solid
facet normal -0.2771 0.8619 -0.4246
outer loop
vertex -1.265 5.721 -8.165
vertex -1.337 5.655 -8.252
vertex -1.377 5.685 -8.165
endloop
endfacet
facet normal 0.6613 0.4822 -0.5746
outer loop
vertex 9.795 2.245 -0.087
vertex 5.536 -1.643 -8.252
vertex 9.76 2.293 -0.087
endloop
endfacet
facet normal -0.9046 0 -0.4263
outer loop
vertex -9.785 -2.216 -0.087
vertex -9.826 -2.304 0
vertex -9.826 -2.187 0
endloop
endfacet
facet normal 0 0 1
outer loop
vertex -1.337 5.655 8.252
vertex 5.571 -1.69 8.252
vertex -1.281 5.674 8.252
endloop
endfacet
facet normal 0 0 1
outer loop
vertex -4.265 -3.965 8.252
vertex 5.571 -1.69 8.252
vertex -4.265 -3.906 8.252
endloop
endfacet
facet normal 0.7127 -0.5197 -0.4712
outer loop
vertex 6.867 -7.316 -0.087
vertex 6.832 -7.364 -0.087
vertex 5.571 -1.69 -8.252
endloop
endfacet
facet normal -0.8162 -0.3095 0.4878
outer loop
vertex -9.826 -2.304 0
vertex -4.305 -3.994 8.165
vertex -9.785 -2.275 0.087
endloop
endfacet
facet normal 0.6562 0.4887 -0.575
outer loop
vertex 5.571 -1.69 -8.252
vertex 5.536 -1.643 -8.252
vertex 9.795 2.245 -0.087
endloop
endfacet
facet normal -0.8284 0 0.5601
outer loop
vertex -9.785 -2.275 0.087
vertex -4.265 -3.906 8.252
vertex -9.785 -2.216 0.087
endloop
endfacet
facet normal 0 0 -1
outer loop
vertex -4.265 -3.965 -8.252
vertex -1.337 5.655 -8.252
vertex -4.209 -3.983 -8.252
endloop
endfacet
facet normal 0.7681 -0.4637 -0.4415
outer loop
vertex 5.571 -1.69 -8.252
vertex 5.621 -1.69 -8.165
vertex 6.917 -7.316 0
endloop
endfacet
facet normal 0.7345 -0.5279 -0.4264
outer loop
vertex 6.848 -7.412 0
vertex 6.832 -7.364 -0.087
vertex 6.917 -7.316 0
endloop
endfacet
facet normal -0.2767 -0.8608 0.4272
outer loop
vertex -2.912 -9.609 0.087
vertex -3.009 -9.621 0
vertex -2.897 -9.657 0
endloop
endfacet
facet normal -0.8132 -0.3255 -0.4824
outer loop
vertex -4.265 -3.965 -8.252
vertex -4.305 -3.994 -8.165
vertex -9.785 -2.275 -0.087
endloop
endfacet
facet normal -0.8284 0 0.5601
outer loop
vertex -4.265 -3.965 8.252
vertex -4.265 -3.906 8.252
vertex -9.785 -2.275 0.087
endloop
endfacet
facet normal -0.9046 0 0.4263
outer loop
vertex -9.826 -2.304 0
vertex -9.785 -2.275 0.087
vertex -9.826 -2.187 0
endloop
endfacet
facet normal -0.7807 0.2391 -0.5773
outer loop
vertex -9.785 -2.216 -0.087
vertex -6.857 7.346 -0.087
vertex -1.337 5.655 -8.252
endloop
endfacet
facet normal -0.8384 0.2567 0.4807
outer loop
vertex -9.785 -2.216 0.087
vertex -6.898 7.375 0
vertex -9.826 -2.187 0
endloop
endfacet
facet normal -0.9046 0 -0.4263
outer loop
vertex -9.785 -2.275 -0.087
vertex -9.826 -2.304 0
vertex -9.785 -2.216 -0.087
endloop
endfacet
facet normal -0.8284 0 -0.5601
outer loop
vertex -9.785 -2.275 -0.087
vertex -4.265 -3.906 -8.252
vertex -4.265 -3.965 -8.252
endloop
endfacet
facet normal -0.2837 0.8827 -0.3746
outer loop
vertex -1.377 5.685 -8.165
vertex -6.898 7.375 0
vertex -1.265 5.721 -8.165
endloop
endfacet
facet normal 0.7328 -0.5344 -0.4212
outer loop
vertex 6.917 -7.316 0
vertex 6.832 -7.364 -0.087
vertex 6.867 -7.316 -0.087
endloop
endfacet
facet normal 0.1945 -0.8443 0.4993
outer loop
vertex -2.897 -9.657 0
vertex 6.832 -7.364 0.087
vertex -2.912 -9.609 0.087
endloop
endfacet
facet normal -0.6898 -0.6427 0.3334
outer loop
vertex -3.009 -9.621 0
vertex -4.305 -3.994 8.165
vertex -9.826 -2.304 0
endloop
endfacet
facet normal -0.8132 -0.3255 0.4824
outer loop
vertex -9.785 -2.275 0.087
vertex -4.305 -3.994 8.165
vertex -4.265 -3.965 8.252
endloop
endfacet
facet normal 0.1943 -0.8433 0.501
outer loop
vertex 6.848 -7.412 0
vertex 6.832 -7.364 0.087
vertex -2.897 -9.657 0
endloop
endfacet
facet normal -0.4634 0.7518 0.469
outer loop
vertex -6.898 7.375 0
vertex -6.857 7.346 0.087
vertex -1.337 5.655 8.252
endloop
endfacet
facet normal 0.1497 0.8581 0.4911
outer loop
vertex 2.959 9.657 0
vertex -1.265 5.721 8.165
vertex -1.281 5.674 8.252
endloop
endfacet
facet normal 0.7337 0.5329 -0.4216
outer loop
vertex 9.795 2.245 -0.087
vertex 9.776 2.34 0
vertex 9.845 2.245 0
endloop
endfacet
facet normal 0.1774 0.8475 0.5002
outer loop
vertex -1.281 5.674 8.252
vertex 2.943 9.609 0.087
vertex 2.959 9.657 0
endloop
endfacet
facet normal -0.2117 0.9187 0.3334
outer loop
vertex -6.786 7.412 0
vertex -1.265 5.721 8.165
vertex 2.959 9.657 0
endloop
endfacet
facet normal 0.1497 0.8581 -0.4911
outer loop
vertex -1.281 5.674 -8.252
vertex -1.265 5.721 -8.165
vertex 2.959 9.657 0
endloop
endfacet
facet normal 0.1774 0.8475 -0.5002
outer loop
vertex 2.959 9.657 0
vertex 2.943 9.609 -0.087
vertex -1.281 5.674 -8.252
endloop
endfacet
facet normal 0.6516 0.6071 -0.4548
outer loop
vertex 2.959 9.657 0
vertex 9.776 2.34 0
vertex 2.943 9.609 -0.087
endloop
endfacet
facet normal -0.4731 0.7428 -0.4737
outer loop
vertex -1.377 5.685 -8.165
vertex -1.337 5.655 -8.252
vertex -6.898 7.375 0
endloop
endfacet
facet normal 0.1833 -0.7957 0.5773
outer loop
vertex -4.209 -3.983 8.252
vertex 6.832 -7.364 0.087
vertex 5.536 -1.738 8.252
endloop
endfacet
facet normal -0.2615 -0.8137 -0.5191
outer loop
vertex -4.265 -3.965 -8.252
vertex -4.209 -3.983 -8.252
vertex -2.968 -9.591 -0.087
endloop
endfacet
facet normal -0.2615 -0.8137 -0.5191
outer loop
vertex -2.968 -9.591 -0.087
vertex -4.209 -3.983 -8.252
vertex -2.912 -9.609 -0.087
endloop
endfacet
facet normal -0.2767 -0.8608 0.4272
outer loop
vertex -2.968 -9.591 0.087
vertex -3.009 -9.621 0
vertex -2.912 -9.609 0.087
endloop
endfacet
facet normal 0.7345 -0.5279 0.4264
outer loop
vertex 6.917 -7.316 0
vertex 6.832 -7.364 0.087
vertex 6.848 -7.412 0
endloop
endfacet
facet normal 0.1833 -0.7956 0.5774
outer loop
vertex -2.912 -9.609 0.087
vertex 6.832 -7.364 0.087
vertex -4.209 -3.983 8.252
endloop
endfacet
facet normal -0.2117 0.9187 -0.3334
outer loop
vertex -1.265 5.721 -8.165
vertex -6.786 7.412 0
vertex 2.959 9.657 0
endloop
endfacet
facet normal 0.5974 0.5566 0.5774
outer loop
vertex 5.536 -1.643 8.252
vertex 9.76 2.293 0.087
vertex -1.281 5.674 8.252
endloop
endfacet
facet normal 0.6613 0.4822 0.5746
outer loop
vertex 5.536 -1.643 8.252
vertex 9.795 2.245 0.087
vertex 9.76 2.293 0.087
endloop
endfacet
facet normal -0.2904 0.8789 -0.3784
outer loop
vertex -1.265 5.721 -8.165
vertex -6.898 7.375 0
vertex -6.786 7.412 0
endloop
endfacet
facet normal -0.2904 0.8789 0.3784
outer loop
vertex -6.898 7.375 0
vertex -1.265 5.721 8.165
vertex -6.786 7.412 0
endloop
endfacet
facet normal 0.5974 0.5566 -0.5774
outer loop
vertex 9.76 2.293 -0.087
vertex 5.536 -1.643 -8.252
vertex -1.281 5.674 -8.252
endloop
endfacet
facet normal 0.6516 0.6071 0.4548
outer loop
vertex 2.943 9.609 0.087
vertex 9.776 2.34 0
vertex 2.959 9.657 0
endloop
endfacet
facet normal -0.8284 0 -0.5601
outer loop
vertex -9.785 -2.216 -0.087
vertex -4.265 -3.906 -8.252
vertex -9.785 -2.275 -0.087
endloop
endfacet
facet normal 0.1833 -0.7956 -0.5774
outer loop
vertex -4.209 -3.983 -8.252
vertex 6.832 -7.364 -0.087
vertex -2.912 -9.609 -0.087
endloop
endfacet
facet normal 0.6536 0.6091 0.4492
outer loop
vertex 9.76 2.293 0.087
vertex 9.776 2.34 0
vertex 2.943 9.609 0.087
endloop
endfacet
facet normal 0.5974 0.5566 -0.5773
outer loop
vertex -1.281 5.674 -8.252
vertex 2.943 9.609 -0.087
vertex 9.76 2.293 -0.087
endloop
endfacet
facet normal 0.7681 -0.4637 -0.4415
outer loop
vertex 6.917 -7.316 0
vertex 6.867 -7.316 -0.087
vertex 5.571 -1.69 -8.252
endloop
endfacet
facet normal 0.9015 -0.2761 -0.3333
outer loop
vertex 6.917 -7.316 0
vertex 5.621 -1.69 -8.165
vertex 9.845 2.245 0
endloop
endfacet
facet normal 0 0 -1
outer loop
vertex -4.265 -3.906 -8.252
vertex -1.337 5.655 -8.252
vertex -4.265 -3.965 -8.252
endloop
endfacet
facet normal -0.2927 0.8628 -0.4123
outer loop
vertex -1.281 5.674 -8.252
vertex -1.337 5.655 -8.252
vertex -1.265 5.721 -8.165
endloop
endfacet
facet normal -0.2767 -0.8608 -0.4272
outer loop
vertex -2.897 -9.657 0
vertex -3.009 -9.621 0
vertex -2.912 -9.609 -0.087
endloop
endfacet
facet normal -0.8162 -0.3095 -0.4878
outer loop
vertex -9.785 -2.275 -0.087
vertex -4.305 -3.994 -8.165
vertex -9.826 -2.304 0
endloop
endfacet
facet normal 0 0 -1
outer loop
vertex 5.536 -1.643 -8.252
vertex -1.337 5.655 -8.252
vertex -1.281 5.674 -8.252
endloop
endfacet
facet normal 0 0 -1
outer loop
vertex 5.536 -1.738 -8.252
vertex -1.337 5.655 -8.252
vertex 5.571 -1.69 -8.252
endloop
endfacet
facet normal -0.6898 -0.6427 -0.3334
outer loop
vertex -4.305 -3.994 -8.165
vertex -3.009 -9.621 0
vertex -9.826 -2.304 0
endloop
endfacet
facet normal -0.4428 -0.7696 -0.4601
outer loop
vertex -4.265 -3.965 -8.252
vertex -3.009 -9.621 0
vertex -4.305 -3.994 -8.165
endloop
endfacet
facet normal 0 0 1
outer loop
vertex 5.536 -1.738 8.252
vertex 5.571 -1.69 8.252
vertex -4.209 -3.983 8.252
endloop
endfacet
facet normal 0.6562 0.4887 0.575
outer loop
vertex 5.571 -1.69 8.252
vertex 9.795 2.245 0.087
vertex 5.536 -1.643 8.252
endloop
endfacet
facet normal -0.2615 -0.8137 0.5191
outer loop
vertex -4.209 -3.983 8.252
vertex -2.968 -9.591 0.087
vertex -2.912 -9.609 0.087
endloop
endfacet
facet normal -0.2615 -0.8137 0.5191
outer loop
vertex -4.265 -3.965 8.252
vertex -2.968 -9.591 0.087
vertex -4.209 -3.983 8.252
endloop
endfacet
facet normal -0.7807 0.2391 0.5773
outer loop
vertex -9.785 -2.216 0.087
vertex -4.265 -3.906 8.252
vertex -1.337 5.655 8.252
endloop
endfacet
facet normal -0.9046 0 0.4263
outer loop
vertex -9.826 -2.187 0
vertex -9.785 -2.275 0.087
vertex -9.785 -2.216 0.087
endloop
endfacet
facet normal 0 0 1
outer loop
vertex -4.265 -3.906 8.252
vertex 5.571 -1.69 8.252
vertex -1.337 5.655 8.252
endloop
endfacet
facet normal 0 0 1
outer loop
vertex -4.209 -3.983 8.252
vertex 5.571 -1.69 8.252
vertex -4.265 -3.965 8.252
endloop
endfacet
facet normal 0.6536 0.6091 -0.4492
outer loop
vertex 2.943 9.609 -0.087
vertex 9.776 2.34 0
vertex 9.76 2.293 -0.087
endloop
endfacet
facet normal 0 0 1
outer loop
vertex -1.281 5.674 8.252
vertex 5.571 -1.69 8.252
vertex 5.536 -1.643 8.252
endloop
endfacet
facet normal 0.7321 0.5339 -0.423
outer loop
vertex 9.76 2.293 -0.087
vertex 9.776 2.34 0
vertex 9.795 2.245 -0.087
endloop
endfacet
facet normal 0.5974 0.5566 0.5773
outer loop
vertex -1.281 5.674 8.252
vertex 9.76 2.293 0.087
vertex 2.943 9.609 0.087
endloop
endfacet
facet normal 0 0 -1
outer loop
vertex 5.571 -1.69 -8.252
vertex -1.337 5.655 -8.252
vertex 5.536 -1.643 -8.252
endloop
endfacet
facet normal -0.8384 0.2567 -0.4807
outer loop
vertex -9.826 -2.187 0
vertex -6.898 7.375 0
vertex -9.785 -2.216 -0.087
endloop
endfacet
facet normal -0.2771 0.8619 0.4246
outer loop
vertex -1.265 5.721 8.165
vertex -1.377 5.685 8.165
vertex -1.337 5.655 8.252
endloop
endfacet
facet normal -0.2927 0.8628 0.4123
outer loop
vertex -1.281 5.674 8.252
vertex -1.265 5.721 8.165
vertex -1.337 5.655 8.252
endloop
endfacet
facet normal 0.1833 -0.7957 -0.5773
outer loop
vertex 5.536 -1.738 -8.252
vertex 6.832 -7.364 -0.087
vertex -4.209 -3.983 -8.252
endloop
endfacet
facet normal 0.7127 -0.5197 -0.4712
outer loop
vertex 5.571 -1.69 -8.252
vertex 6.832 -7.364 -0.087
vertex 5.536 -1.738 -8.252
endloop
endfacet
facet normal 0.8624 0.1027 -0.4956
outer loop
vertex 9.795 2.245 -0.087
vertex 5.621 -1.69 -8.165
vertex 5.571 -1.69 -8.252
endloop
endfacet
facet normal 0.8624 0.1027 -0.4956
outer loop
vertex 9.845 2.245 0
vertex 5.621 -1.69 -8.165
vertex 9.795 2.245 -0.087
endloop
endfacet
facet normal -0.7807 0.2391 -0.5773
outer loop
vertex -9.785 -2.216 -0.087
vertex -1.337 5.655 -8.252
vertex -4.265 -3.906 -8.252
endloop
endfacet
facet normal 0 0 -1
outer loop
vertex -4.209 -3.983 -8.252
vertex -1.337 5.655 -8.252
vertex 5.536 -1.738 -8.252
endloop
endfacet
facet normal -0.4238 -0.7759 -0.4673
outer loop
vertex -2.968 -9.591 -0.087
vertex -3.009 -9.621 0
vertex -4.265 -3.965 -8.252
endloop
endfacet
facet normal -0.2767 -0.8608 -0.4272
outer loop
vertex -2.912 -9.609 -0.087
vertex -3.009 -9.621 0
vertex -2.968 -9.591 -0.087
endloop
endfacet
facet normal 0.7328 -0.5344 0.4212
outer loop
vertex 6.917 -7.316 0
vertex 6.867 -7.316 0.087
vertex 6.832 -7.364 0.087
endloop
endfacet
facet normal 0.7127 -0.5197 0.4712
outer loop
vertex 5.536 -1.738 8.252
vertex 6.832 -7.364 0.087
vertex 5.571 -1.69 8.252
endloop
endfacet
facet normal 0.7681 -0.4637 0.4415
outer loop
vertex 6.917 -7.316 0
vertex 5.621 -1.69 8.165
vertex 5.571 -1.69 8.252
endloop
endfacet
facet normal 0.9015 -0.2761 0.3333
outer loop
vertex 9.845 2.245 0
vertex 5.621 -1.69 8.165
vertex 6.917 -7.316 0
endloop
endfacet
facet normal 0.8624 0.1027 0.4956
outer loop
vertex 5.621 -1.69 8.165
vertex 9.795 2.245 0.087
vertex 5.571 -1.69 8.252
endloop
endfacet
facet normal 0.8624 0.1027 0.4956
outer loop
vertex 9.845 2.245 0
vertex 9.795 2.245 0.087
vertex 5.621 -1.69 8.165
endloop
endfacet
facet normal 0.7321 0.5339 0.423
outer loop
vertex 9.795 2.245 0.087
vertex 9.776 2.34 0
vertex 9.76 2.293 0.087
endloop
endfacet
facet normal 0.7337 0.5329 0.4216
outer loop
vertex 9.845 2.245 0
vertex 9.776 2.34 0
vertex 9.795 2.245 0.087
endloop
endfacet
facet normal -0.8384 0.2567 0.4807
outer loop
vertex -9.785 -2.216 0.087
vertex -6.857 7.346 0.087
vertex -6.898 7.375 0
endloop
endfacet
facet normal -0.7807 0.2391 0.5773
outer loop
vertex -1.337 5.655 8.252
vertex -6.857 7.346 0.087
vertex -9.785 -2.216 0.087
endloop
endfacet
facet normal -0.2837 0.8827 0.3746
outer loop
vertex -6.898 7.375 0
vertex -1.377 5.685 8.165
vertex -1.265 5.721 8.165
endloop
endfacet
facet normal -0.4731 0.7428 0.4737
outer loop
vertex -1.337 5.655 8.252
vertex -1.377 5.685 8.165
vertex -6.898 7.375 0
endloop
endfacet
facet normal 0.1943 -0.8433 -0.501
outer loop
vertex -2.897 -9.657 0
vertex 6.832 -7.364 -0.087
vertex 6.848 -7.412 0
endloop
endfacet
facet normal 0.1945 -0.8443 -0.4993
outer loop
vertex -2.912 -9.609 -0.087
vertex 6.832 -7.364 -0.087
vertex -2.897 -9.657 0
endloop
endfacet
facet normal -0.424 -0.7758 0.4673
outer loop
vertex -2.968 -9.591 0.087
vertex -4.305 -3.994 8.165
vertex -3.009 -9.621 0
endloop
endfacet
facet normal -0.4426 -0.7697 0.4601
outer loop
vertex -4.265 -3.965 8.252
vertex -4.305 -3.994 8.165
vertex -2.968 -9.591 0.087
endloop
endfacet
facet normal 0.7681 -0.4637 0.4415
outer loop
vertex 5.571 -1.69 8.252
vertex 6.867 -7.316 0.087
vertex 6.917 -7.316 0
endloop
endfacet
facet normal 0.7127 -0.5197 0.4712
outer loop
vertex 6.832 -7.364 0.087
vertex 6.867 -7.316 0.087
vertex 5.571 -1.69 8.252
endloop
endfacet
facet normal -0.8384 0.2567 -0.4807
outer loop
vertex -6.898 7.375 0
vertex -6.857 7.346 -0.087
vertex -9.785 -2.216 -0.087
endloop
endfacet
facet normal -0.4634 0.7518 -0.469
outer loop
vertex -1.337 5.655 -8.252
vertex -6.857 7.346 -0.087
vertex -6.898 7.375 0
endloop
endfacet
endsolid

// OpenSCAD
// Auto-generated OpenSCAD file

    inner_points = 10*[[-0.42241592184244553, -0.3935709876343616, 0.8164965809276301], [0.552050434404801, -0.1690374254610991, 0.8164965809279018], [-0.1296345125630803, 0.5626084130956421, 0.8164965809276461], [0.5520504344052842, -0.16903742546121997, -0.8164965809275502], [-0.29278140927936525, -0.9561794007300037, -1.5987211554602254e-14], [0.29278140927936525, 0.9561794007300037, 1.5987211554602254e-14], [-0.42241592184196236, -0.3935709876344824, -0.816496580927822], [0.6816849469678814, -0.7316458385567411, 2.5579538487363607e-13], [-0.6816849469678814, 0.7316458385567411, -2.5579538487363607e-13], [-0.12963451256259706, 0.5626084130955212, -0.816496580927806], [-0.9744663562472466, -0.22453356217326248, -2.7176669244139555e-13], [0.9744663562472466, 0.22453356217326248, 2.7176669244139555e-13]];

    outer_points = 10*[[0.1279020562557553, -0.9484628204349614, 0.2899298919706412], [0.5177054037875468, -0.6332250521206378, -0.5753322068648584], [0.9027667961251077, -0.3163375745111199, 0.2914492250228672], [-0.5145441003247264, 0.6321252459238417, -0.5793634802839585], [-0.7748647398693524, -0.6321252459238417, -0.001519333052226013], [0.7748647398693524, 0.6321252459238417, 0.001519333052226013], [-0.904347447856518, 0.316887477609518, 0.2858986185515415], [-0.38506139233756087, -0.316887477609518, -0.8667814318877258], [0.38506139233756087, 0.316887477609518, 0.8667814318877258], [-0.12948270798716557, 0.9490127235333596, 0.28741795160376743], [-0.3898033475317915, -0.31523776831432365, 0.8652620988354998], [0.3898033475317915, 0.31523776831432365, -0.8652620988354998]];

    // Convex hull for inner set (I)
    module inner_hull() {
        hull() {
            for (p = inner_points) {
                translate(p) sphere(r=0.1);
            }
        }
    }

    // Convex hull for outer set (O) minus inner hull (O \ I)
    module outer_minus_inner() {
        difference() {
            hull() {
                for (p = outer_points) {
                    translate(p) sphere(r=0.1);
                }
            }
            inner_hull(); // Subtract inner hull
        }
    }

    // Convex hull for outer set (O) minus all translated inner hulls
    module outer_minus_AllTranslationInner() {
        difference() {
            hull() {
                for (p = outer_points) {
                    translate(p) sphere(r=0.1);
                }
            }
            hull() {
                translate([0,0,50]) inner_hull();
                translate([0,0,-50]) inner_hull();
            }; // Subtract translated inner hulls
        }
    }

    // Difference between outer_minus_inner and outer_minus_AllTranslationInner
    module outer_minus_inner_diff() {
        difference() {
            // Outer minus inner
            difference() {
                hull() {
                    for (p = outer_points) {
                        translate(p) sphere(r=0.1);
                    }
                }
                inner_hull();
            }

            // Subtract Outer minus AllTranslationInner
            difference() {
                hull() {
                    for (p = outer_points) {
                        translate(p) sphere(r=0.1);
                    }
                }
                hull() {
                    translate([0,0,50]) inner_hull();
                    translate([0,0,-50]) inner_hull();
                };
            }
        }
    }

    // Rendering all with colors applied
    color([1, 0, 0, 0.5]) inner_hull(); // Transparent red
    
